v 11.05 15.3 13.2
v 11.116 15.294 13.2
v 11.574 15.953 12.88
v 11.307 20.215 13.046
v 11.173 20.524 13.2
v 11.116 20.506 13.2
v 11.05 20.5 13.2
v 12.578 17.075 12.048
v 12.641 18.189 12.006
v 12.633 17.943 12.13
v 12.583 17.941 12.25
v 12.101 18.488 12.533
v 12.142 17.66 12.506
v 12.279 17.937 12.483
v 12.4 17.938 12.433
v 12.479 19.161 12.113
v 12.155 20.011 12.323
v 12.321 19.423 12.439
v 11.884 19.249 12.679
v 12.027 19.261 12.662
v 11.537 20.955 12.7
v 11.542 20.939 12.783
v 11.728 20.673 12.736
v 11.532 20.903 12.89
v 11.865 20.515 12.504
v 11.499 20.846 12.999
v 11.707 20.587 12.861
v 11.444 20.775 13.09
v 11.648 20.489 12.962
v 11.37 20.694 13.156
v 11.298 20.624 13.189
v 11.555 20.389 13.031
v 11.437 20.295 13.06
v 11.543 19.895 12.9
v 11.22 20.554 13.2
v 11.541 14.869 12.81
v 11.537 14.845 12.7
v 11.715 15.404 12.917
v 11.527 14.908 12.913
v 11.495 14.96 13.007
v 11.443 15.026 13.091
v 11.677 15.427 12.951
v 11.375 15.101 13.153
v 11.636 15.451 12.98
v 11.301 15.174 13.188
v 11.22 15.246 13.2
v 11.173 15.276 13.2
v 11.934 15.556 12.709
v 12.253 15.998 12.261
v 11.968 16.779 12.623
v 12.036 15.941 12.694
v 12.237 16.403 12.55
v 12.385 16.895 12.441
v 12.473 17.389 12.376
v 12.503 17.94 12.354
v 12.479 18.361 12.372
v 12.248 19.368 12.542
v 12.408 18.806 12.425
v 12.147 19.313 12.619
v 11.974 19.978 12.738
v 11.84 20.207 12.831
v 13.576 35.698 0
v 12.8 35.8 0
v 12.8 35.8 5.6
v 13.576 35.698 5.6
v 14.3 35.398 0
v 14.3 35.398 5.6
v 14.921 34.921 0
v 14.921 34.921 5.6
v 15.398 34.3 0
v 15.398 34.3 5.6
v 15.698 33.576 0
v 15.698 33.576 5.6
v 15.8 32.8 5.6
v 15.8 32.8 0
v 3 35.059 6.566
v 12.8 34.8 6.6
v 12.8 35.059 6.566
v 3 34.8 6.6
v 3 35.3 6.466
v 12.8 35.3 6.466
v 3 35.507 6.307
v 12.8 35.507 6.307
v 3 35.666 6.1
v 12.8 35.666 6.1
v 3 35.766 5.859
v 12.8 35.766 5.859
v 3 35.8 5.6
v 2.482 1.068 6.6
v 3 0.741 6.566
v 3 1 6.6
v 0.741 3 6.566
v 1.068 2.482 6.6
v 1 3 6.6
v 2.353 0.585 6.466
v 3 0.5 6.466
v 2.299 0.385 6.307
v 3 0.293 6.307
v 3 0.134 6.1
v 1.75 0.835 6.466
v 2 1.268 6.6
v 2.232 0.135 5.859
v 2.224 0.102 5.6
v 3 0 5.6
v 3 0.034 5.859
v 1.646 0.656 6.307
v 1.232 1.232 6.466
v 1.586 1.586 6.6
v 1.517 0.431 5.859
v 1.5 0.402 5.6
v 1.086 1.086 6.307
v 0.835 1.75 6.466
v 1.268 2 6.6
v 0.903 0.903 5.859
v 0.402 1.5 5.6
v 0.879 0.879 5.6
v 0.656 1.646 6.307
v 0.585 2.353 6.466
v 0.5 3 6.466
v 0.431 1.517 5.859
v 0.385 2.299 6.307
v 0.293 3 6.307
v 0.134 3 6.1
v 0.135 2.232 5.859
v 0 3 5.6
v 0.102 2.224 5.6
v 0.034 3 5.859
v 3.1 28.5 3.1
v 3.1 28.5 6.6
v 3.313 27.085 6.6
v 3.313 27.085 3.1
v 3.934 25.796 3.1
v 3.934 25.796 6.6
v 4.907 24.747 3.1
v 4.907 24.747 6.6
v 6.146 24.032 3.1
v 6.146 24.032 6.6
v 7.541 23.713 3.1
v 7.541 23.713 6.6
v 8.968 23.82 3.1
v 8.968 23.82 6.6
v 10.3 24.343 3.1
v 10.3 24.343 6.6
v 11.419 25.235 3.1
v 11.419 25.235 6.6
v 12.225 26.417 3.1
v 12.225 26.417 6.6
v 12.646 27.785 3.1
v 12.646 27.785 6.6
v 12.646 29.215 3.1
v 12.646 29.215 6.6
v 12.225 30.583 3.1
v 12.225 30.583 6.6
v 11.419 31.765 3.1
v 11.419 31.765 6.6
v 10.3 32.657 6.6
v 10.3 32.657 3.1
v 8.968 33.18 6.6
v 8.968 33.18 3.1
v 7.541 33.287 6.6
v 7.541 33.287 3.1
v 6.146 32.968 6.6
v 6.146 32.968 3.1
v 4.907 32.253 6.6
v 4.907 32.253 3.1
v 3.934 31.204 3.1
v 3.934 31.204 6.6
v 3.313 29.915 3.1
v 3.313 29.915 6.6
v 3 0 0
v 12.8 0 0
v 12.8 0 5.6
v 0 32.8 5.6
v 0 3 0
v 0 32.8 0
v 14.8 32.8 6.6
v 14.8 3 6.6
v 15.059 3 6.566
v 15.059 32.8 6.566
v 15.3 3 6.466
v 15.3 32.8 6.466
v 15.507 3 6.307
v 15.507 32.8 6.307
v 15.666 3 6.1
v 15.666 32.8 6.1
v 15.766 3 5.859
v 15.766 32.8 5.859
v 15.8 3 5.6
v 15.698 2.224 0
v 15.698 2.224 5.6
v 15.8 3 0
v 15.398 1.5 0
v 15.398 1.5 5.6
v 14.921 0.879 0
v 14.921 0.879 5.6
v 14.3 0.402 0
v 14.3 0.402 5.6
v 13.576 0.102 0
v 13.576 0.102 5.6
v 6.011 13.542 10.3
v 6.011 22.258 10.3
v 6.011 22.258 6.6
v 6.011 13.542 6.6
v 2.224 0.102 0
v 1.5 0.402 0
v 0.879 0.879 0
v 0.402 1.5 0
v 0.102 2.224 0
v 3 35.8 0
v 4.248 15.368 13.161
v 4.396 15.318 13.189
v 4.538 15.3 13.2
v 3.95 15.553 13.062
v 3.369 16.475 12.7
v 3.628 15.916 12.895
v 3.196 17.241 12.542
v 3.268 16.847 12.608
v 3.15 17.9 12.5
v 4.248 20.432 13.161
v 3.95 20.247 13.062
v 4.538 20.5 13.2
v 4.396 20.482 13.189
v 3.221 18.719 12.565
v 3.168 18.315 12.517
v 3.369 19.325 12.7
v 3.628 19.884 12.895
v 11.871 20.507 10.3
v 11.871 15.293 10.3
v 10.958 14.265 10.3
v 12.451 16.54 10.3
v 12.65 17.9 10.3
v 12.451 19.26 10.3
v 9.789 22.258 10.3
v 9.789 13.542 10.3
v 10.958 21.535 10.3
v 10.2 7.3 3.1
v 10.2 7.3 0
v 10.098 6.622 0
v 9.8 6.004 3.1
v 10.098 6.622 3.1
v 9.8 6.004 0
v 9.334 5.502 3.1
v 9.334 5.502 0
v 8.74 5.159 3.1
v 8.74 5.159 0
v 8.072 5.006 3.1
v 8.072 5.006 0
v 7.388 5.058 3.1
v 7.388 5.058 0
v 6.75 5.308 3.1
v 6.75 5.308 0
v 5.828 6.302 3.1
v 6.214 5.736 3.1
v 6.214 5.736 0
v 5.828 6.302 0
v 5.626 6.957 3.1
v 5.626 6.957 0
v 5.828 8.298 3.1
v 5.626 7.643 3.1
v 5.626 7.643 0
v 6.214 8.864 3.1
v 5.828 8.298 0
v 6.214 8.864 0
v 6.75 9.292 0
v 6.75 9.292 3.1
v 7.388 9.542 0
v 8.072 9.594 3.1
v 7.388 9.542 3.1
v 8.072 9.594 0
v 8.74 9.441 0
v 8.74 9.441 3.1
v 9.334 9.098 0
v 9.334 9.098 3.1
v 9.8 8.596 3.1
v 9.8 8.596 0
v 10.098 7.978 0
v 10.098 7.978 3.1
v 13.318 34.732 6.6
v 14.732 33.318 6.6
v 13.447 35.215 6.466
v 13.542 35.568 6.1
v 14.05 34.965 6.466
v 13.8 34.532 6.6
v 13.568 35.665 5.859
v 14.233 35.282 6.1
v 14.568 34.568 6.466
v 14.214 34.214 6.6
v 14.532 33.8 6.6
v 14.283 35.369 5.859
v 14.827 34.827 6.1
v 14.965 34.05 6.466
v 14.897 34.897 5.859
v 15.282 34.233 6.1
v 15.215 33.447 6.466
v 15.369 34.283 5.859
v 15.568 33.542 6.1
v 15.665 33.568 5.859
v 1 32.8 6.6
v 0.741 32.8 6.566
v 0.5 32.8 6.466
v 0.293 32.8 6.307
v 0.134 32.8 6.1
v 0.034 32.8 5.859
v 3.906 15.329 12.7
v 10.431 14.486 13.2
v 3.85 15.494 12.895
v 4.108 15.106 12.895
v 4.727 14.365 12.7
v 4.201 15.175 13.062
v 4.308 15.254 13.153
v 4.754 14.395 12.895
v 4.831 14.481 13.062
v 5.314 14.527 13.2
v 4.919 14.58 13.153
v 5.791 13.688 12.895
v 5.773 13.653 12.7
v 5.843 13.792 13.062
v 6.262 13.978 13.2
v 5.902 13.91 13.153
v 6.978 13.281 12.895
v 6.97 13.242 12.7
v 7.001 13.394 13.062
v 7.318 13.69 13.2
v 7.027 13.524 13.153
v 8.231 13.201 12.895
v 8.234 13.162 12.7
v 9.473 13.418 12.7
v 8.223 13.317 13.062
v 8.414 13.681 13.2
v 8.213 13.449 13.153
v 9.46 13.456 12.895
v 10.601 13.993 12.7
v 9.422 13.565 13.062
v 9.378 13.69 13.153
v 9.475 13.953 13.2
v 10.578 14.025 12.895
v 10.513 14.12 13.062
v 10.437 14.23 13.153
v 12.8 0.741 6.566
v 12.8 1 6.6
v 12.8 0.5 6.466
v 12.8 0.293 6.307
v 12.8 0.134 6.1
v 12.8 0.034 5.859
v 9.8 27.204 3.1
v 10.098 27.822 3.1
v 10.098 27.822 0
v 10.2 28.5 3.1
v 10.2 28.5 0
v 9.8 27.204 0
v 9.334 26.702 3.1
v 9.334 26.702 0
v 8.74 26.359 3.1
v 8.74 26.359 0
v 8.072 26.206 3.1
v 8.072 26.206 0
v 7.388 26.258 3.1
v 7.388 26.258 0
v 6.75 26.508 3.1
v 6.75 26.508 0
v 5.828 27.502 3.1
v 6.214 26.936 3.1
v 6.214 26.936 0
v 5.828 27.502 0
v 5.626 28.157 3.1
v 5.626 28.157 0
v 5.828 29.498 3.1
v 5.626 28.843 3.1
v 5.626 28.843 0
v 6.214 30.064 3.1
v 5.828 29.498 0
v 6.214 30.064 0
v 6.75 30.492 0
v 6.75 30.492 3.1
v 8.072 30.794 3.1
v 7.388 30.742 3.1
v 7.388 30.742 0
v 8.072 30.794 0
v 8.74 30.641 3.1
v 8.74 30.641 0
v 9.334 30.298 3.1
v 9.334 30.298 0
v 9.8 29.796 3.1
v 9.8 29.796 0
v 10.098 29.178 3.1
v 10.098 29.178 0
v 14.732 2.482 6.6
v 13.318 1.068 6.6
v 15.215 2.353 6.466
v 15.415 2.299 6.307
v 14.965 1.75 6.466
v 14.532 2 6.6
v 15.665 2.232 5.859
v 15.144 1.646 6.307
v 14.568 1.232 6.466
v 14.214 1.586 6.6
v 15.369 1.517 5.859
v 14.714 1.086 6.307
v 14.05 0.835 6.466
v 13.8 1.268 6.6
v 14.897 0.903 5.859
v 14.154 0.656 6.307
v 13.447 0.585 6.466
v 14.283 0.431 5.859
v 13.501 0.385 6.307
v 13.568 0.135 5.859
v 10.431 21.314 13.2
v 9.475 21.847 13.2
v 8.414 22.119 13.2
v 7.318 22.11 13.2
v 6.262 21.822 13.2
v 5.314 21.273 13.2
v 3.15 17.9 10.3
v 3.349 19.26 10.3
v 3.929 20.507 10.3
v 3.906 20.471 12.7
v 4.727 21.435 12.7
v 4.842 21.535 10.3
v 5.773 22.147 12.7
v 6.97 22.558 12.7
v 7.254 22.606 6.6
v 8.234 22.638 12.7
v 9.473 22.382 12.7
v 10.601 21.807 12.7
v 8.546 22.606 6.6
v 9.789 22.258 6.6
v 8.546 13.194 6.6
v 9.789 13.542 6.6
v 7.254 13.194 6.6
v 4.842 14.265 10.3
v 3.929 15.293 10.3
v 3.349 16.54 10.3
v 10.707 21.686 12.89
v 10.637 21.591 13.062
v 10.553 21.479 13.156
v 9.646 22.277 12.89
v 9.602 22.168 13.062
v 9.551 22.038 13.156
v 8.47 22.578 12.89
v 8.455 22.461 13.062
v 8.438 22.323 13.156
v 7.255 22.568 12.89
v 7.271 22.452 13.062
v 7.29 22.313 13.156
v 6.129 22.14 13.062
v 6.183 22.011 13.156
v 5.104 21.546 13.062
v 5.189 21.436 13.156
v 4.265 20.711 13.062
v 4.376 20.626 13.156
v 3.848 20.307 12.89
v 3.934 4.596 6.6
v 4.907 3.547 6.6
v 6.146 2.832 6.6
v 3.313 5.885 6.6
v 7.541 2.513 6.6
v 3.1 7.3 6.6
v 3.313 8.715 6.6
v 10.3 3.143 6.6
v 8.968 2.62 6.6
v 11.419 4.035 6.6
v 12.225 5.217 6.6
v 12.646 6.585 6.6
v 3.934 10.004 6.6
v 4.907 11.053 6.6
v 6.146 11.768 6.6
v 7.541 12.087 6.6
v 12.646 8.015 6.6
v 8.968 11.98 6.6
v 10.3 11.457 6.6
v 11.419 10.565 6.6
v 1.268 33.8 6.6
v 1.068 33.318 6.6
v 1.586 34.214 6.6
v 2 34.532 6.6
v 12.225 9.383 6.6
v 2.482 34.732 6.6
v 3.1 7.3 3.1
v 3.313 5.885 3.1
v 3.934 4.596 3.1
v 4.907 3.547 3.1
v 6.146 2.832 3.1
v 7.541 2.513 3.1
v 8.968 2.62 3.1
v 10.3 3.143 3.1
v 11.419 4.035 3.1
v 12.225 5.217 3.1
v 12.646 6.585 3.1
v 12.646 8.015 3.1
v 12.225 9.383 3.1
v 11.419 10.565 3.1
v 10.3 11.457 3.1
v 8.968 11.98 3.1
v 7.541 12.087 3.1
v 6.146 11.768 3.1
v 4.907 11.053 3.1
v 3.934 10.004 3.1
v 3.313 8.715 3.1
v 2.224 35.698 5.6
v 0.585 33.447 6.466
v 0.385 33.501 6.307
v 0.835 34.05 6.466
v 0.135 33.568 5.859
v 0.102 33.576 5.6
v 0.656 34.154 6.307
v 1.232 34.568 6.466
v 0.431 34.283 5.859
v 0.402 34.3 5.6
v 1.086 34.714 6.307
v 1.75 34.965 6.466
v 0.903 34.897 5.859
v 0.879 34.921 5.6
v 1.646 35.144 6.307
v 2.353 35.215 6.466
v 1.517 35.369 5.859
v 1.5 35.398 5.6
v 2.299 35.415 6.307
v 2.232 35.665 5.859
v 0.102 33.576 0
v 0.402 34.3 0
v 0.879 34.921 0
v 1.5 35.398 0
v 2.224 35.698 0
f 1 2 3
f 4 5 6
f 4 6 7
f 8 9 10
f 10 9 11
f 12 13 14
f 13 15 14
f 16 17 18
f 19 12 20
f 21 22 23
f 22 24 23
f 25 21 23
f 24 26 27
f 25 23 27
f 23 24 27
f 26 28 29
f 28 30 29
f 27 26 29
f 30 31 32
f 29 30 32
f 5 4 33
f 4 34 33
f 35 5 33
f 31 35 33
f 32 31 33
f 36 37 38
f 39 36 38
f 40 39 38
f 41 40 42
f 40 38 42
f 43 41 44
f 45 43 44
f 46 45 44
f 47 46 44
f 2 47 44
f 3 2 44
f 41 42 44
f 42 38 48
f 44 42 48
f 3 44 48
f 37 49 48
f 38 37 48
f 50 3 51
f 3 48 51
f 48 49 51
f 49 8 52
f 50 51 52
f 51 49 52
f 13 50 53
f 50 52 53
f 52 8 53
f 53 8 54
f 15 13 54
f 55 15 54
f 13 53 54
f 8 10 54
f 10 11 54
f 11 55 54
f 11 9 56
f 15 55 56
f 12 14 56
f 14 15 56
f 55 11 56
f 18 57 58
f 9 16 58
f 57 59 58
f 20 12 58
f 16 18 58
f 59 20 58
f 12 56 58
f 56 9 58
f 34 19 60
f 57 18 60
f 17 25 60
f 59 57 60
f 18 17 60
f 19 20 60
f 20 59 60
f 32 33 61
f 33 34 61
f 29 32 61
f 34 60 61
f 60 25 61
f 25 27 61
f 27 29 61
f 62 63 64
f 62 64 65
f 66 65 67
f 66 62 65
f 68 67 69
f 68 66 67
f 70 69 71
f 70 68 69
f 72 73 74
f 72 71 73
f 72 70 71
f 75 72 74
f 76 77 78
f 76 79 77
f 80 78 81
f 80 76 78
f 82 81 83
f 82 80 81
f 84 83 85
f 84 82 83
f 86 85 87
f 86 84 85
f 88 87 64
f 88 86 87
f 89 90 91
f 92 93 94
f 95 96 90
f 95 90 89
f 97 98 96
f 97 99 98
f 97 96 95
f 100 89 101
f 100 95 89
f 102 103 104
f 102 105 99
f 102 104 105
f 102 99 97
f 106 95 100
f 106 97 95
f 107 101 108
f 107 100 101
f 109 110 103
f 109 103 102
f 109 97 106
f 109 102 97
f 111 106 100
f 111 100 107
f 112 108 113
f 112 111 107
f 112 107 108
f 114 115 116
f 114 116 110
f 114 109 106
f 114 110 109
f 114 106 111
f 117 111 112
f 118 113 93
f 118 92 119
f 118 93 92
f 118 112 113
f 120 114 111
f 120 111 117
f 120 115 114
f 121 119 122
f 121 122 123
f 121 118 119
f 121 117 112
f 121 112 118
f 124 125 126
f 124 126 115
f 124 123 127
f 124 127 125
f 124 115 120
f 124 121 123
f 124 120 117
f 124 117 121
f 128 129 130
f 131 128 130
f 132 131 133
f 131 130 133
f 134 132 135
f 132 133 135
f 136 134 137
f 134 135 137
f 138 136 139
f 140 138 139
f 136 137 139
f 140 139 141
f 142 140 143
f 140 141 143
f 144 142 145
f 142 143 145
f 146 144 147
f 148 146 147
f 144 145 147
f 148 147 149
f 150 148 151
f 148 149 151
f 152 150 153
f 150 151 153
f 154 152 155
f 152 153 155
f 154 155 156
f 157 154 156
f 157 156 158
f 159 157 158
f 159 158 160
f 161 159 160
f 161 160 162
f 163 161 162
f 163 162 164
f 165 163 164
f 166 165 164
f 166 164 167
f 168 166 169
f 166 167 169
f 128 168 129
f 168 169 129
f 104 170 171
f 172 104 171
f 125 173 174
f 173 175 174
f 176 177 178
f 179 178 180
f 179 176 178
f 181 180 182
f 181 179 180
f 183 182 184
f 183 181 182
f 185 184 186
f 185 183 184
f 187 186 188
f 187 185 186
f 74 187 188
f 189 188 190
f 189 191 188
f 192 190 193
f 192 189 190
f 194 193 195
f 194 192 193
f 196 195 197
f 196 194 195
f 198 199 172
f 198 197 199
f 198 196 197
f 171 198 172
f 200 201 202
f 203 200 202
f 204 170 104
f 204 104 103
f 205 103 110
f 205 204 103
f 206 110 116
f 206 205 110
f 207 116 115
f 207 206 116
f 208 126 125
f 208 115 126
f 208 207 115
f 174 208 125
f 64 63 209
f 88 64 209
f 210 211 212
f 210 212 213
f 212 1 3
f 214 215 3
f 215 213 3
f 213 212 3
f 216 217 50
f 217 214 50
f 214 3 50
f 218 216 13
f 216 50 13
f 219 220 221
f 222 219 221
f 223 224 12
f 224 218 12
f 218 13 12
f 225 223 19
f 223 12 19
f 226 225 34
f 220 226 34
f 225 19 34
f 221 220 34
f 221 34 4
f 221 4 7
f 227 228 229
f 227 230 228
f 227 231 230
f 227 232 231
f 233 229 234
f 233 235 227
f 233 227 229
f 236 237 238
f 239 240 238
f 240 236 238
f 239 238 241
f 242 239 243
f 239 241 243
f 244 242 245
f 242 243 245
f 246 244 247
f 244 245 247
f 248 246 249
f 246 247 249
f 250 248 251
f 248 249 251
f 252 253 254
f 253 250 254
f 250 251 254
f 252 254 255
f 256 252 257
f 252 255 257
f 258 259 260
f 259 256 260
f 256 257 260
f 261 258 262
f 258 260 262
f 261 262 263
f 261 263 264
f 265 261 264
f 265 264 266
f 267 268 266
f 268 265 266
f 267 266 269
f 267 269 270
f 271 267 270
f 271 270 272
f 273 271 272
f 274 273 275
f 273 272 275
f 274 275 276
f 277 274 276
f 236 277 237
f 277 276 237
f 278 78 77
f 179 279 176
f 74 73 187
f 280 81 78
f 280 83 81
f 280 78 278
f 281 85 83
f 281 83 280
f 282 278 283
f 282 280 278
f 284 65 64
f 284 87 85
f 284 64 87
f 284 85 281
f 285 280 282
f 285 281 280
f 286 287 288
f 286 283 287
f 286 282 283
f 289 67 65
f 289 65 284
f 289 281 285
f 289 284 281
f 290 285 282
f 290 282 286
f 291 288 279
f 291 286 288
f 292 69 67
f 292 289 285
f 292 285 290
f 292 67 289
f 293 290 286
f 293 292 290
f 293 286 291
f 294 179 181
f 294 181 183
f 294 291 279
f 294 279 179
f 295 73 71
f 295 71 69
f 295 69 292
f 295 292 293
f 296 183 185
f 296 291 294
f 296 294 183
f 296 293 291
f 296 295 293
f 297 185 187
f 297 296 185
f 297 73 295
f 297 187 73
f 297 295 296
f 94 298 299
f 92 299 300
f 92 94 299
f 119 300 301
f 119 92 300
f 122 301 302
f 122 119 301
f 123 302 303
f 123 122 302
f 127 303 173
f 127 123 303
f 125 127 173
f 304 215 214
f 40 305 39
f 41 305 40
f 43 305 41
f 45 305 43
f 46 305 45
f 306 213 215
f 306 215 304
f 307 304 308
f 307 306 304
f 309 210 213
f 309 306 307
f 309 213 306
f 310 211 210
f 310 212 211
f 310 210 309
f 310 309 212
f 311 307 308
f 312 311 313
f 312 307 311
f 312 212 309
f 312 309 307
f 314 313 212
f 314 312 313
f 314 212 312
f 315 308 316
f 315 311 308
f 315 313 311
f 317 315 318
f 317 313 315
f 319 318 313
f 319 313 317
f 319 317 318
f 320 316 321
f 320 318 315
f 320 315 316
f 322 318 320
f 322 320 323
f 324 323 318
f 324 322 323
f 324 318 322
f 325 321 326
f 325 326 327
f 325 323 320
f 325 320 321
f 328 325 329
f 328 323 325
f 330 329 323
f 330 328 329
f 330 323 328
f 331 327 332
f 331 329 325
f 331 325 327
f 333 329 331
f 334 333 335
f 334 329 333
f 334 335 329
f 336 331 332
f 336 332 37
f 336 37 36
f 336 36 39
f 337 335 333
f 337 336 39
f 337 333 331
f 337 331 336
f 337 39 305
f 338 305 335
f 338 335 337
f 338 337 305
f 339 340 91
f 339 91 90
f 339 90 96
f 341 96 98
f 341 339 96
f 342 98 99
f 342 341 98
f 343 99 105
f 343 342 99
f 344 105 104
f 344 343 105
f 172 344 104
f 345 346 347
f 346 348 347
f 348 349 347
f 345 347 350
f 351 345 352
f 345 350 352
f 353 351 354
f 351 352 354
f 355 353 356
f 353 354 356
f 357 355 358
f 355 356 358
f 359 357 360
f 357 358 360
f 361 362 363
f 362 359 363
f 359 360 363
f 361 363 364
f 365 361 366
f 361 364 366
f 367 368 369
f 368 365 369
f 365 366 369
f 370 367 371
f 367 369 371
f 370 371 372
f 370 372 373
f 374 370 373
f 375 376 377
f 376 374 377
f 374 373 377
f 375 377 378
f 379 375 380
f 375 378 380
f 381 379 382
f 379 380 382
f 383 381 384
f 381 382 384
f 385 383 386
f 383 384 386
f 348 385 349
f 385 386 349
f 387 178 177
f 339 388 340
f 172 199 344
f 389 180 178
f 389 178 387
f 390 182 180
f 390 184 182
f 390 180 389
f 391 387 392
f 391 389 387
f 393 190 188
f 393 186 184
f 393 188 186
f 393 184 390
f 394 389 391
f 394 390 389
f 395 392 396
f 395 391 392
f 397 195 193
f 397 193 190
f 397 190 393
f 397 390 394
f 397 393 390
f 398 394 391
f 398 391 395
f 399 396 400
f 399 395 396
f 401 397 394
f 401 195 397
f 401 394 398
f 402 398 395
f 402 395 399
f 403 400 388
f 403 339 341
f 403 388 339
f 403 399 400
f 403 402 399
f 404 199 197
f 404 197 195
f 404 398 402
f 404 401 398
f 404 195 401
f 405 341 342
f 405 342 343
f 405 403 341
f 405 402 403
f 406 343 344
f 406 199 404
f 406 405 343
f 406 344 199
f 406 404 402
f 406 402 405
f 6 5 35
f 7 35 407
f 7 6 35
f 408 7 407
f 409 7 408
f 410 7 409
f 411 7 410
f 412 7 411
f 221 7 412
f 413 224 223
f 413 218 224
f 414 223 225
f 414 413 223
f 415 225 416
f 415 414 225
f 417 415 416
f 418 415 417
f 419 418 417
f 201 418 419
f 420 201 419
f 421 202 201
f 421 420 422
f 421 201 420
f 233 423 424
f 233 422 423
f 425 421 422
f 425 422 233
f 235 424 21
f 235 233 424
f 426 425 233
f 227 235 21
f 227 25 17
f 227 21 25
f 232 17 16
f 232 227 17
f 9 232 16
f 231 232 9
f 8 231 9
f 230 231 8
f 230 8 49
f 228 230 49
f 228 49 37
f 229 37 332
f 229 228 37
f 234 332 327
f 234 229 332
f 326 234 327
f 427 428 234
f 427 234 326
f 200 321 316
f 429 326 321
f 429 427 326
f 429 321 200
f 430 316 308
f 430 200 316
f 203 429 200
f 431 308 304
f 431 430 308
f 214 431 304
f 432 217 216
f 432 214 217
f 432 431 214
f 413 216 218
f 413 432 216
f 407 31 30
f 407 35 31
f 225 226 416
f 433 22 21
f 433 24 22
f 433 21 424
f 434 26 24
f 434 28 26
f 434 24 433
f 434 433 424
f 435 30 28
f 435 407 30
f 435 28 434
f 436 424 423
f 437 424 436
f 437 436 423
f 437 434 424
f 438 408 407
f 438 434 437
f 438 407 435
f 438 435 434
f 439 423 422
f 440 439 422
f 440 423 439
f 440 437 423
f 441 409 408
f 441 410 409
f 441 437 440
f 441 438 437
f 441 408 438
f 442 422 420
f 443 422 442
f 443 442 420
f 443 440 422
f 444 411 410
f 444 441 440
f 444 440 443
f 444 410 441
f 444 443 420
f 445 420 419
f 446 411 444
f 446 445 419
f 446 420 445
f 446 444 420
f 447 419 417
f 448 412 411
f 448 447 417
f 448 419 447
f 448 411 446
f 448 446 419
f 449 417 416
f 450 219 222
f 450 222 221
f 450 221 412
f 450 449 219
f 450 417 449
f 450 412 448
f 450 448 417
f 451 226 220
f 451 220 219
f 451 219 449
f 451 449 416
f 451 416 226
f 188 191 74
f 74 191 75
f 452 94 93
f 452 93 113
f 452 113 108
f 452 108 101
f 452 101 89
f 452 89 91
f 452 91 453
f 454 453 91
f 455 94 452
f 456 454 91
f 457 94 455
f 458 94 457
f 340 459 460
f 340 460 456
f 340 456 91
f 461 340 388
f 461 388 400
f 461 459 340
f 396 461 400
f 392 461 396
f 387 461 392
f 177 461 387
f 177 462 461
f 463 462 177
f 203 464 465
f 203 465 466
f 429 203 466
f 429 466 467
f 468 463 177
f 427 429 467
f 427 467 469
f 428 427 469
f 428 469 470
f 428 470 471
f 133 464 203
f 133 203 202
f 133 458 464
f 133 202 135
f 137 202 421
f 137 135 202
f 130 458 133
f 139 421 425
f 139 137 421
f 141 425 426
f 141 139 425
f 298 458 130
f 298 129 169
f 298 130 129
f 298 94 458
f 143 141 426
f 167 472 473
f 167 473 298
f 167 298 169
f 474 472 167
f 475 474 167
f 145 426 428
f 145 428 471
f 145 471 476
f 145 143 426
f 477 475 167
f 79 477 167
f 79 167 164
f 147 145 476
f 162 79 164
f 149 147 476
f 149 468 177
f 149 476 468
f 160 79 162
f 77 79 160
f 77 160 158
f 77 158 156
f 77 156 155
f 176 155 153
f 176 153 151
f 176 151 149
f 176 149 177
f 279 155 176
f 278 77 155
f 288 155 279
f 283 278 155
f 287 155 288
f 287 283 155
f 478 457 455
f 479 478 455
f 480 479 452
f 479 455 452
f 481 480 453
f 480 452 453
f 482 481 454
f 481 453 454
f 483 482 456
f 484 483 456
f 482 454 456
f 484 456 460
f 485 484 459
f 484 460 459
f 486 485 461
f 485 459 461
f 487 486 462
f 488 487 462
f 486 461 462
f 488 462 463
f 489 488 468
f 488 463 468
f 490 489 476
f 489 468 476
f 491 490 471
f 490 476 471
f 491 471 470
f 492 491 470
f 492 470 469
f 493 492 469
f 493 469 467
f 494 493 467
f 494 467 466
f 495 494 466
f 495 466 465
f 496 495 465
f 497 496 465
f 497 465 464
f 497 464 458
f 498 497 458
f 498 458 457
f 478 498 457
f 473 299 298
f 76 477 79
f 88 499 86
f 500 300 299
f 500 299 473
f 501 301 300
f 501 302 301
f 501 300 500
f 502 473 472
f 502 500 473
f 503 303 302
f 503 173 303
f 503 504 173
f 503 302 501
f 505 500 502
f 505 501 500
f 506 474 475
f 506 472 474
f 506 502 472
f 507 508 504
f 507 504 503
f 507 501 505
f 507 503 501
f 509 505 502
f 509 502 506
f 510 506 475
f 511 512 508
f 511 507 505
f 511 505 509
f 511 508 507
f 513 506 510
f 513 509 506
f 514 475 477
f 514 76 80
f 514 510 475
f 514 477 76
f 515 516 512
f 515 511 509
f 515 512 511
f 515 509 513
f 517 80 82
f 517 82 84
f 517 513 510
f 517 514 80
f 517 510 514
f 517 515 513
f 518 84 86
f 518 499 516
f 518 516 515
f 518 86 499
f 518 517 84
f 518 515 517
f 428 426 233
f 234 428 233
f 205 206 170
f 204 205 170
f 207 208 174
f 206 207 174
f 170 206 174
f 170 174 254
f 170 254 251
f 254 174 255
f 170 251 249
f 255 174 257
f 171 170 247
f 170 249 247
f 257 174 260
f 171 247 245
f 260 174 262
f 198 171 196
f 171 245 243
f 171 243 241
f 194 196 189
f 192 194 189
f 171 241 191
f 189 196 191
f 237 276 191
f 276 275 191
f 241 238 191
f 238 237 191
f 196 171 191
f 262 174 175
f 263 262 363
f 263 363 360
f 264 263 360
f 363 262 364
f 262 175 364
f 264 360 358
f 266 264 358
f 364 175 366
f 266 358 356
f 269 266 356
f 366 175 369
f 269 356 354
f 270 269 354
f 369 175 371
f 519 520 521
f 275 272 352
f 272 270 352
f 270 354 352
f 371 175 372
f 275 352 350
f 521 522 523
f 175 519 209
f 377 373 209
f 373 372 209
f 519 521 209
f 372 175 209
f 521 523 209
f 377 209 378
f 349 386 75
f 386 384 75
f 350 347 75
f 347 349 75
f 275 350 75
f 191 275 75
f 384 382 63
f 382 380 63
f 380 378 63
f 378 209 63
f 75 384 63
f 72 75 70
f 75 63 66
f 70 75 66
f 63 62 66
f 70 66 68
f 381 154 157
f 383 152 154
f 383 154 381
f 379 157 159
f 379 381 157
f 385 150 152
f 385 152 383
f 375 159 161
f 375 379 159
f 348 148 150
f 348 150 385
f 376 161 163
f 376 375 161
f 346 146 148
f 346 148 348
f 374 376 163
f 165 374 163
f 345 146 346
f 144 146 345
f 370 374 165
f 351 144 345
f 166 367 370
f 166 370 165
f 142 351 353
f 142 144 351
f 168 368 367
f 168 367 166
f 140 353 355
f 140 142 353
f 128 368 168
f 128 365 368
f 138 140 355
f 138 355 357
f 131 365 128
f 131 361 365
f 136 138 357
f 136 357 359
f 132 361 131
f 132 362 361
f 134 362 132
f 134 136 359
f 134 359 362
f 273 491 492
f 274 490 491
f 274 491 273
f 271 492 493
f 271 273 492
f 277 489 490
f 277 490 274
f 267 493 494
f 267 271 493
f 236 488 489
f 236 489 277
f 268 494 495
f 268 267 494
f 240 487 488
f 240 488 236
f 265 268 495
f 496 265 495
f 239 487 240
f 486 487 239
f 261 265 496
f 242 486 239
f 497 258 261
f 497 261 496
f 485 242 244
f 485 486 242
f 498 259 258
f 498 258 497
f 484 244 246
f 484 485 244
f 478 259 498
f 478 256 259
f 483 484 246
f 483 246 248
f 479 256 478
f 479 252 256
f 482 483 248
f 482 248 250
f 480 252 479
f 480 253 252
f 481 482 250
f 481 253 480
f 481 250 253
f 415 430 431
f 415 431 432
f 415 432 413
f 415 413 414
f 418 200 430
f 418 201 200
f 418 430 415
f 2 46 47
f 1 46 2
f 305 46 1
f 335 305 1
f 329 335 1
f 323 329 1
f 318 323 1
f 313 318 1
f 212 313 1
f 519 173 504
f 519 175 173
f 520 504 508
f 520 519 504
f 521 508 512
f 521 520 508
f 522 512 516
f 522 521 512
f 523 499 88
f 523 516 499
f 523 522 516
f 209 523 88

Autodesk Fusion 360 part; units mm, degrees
sketch "Sketch1" plane through (0, 0, 0) normal (0, 0, 1) x (1, 0, 0) in component "Component"
  line L0 (3, 0) -> (12.8, 0)
  line L1 (15.8, 3) -> (15.8, 32.8)
  line L2 (12.8, 35.8) -> (3, 35.8)
  line L3 (0, 32.8) -> (0, 3)
  circle A0 centre (7.9, 28.5) radius 2.3
  line L4 (7.9, 35.8) -> (7.9, 0) construction
  line L5 (0, 17.9) -> (15.8, 17.9) construction
  circle A1 centre (7.9, 7.3) radius 2.3
  arc A2 (12.8, 0) -> (15.8, 3) centre (12.8, 3) ccw
  arc A3 (0, 3) -> (3, 0) centre (3, 3) ccw
  arc A4 (3, 35.8) -> (0, 32.8) centre (3, 32.8) ccw
  arc A5 (15.8, 32.8) -> (12.8, 35.8) centre (12.8, 32.8) ccw
  point P0 (15.8, 0)
  point P1 (0, 35.8)
  dimension "d1" = 15.8
  dimension "d2" = 35.8
  dimension "d3" = 4.6
  dimension "d4" = 7.3
  dimension "d5" = 3
extrude "Extrude1" add sketch "Sketch1" along normal blind 6.6 in component "Component"
sketch "Sketch2" plane through (0, 0, 6.6) normal (0, 0, 1) x (-1, 0, 0) in component "Component"
  circle A0 centre (-7.9, -28.5) radius 2.3
  circle A1 centre (-7.9, -7.3) radius 2.3
  arc A2 (-15.8, -32.8) -> (-12.8, -35.8) centre (-12.8, -32.8) ccw
  line L0 (-12.8, -35.8) -> (-3, -35.8)
  arc A3 (-3, -35.8) -> (0, -32.8) centre (-3, -32.8) ccw
  line L1 (0, -32.8) -> (0, -3)
  arc A4 (0, -3) -> (-3, 0) centre (-3, -3) ccw
  line L2 (-3, 0) -> (-12.8, 0)
  arc A5 (-12.8, 0) -> (-15.8, -3) centre (-12.8, -3) ccw
  line L3 (-15.8, -3) -> (-15.8, -32.8)
  circle A6 centre (-7.9, -28.5) radius 4.8
  circle A7 centre (-7.9, -7.3) radius 4.8
  dimension "d8" = 9.6
  dimension "d9" = 9.6
extrude "Extrude2" cut sketch "Sketch2" against normal blind 3.5 contours A6 | A7 in component "Component"
sketch "Sketch3" plane through (0, 0, 6.6) normal (0, 0, 1) x (-1, 0, 0) in component "Component"
  circle A0 centre (-7.9, -28.5) radius 4.8
  circle A1 centre (-7.9, -7.3) radius 4.8
  arc A2 (-15.8, -32.8) -> (-12.8, -35.8) centre (-12.8, -32.8) ccw
  line L0 (-12.8, -35.8) -> (-3, -35.8)
  arc A3 (-3, -35.8) -> (0, -32.8) centre (-3, -32.8) ccw
  line L1 (0, -32.8) -> (0, -3)
  arc A4 (0, -3) -> (-3, 0) centre (-3, -3) ccw
  line L2 (-3, 0) -> (-12.8, 0)
  arc A5 (-12.8, 0) -> (-15.8, -3) centre (-12.8, -3) ccw
  line L3 (-15.8, -3) -> (-15.8, -32.8)
  line L4 (0, -17.9) -> (-15.8, -17.9) construction
  circle A6 centre (-7.9, -17.9) radius 4.75
  dimension "d12" = 9.5
extrude "Extrude3" add sketch "Sketch3" along normal blind 6.6 contours A6 in component "Component"
ref_plane "WorkPlane2" through (7.9, 17.9, 3.3) normal (0, -1, 0) x (1, 0, 0) in component "Component"
sketch "Sketch6" plane through (7.9, 17.9, 3.3) normal (0, -1, 0) x (1, 0, 0) in component "Component"
  line L0 (4.75, 9.9) -> (-4.75, 9.9)
  line L1 (-4.75, 3.3) -> (4.75, 3.3)
  line L2 (-4.75, 3.3) -> (4.75, 3.3)
  line L3 (4.75, 3.3) -> (4.75, 7)
  line L4 (4.75, 7) -> (-4.75, 7)
  line L5 (-4.75, 7) -> (-4.75, 3.3)
  line L6 (0, 3.3) -> (0, 7) construction
  line L7 (1.8889, 7) -> (-1.8889, 7)
  line L8 (-1.8889, 7) -> (-1.8889, 3.3)
  line L9 (-1.8889, 3.3) -> (1.8889, 3.3)
  line L10 (1.8889, 3.3) -> (1.8889, 7)
  line L11 (1.8889, 7) -> (-1.8889, 3.3) construction
  line L12 (-1.8889, 7) -> (1.8889, 3.3) construction
  point P0 (0, 5.15)
  dimension "d19" = 3.7
  dimension "d20" = 3.7777
extrude "Extrude4" cut sketch "Sketch6" along normal through all and the other way through all contours L1 L2 L4 L5 L8 | L1 L2 L3 L4 L10 in component "Component"
sketch "Sketch7" plane through (0, 0, 13.2) normal (0, 0, 1) x (-1, 0, 0) in component "Component"
  circle A0 centre (-7.9, -17.9) radius 4.75
  line L0 (-13.2651, -15.3) -> (-2.5349, -15.3)
  line L1 (-2.5349, -15.3) -> (-2.5349, -20.5)
  line L2 (-2.5349, -20.5) -> (-13.2651, -20.5)
  line L3 (-13.2651, -20.5) -> (-13.2651, -15.3)
  line L4 (-13.2651, -15.3) -> (-2.5349, -20.5) construction
  line L5 (-2.5349, -15.3) -> (-13.2651, -20.5) construction
  point P0 (-7.9, -17.9)
  dimension "d22" = 5.2
ref_plane "WorkPlane3" through (7.9, 17.9, 3.3) normal (-1, 0, 0) x (0, -1, 0) in component "Component"
sketch "Sketch8" plane through (7.9, 17.9, 3.3) normal (-1, 0, 0) x (0, 1, 0) in component "Component"
  line L0 (-3.8726, -9.2) -> (3.2614, -9.2) construction
  line L1 (2.6, -9.9) -> (-2.6, -9.9)
  line L2 (0, -9.9) -> (0, -9.2) construction
  arc A0 (2.6, -9.9) -> (-2.6, -9.9) centre (0, -14.3786) ccw
  point P0 (-2.6, -9.9)
  point P1 (2.6, -9.9)
  dimension "d23" = 0.7
extrude "Extrude5" cut sketch "Sketch8" along normal through all and the other way through all in component "Component"
fillet "Fillet1" radius 1 8 edges at (7.9, 35.8, 6.6) (0.8787, 34.9213, 6.6) (0, 17.9, 6.6) (0.8787, 0.8787, 6.6) (7.9, 0, 6.6) (14.9213, 0.8787, 6.6) (15.8, 17.9, 6.6) (14.9213, 34.9213, 6.6) in component "Component"
fillet "Fillet1" radius 0.5 2 edges at (7.9, 13.15, 13.2) (7.9, 22.65, 13.2) in component "Component"
fillet "Fillet1" radius 0.5 2 edges at (12.65, 17.9, 12.5) (3.15, 17.9, 12.5) in component "Component"
component "Component" placed x (1, 0, 0) y (0, 1, 0) z (0, 0, 1) at (0, 0, 0)
equation "d4 = 5 mm + ( 4.6 / 2 ) * 1 mm"
equation "peg_diameter = 9.5 mm"
